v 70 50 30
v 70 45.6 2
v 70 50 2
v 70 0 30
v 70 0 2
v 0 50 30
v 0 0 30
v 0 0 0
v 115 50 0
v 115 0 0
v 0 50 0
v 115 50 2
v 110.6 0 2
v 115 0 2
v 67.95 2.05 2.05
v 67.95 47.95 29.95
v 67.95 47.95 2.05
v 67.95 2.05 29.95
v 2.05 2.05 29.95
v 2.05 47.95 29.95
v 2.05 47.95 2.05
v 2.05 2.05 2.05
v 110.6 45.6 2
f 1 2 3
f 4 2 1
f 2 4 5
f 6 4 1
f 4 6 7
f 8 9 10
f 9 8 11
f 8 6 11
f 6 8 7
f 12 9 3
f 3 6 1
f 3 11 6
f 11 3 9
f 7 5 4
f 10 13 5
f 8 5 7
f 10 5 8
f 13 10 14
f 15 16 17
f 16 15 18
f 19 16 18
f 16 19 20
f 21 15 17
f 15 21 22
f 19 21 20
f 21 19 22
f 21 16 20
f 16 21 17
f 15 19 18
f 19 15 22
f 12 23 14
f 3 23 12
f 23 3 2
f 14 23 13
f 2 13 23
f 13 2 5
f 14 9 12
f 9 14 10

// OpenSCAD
// Configuration and Dimensions
// All dimensions in millimetres (mm)

// Box Dimensions (Outer)
$box_outer_x = 70;
$box_outer_y = 50;
$box_outer_z = 30;

// Wall and Floor Thickness
$wall_thickness = 2;
$floor_thickness = 2;

// Lid Dimensions
$plate_thickness = 2;
$lip_thickness = 1.5;
$lip_height = 4;

// Lip Outer Size (to fit inside box opening)
$lip_outer_x = 65.6;
$lip_outer_y = 45.6;

// Clearance
$clearance = 0.2;

// Gap between parts for printing together
$gap = 10;

// Resolution for curved shapes
$fn = 64;

// --- Part 1: The Box ---
// Position: Centred on origin in X, Y. Z starts at 0.
// Outer box is 70x50x30.
// Inner cavity calculation:
// Inner X = 70 - 2*2 = 66
// Inner Y = 50 - 2*2 = 46
// Inner Z = 30 - 2 (floor) = 28 (open top)

translate([0, 0, 0])
difference() {
    // Outer Shell
    cube([
        $box_outer_x, 
        $box_outer_y, 
        $box_outer_z
    ]);
    
    // Cut out the interior
    // We extend the cut slightly past the faces to ensure clean separation
    translate([
        $wall_thickness + 0.05, 
        $wall_thickness + 0.05, 
        $floor_thickness + 0.05
    ])
    cube([
        $box_outer_x - 2*$wall_thickness - 0.1, 
        $box_outer_y - 2*$wall_thickness - 0.1, 
        $box_outer_z - $floor_thickness - 0.1
    ]);
}

// --- Part 2: The Lid ---
// Position: On the +X side of the box, with a 10mm gap.
// Box ends at X = 35. Lid starts at X = 35 + 10 = 45.
// Lid is printed upside down (plate on bed).
// Plate size: 70 x 50 x 2.
// Lip: Outer 65.6 x 45.6, Inner (to fit box) = 65.6 - 0.4 = 65.2 x 45.6 - 0.4 = 45.2.
// Lip thickness 1.5, height 4.

translate([$gap + $box_outer_x / 2, 0, 0])
difference() {
    // 1. The Base Plate (70 x 50 x 2)
    cube([
        $box_outer_x, 
        $box_outer_y, 
        $plate_thickness
    ]);
    
    // 2. The Lip Structure
    // The lip sits ON TOP of the plate (Z = 2 to Z = 6).
    // It has an outer dimension of 65.6 x 45.6.
    // It has an inner hole to slide into the box.
    // Box inner opening is 66 x 46.
    // Lip outer is 65.6 x 45.6.
    // Lip inner needs to be (66 - 0.4) x (46 - 0.4) = 65.2 x 45.6 to allow 0.2mm clearance.
    
    translate([0, 0, $plate_thickness])
    difference() {
        // Solid Lip Block (Outer dimensions)
        cube([
            $lip_outer_x, 
            $lip_outer_y, 
            $lip_height + $lip_thickness
        ]);
        
        // Cut out the slot for the board
        // Extend cut slightly past faces
        translate([
            ($lip_outer_x - ($box_outer_x - 2*$wall_thickness - $clearance*2)) / 2 + 0.05,
            ($lip_outer_y - ($box_outer_y - 2*$wall_thickness - $clearance*2)) / 2 + 0.05,
            $lip_thickness + 0.05
        ])
        cube([
            $box_outer_x - 2*$wall_thickness - $clearance*2 - 0.1,
            $box_outer_y - 2*$wall_thickness - $clearance*2 - 0.1,
            $lip_height + $lip_thickness - 0.1
        ]);
    }
}
